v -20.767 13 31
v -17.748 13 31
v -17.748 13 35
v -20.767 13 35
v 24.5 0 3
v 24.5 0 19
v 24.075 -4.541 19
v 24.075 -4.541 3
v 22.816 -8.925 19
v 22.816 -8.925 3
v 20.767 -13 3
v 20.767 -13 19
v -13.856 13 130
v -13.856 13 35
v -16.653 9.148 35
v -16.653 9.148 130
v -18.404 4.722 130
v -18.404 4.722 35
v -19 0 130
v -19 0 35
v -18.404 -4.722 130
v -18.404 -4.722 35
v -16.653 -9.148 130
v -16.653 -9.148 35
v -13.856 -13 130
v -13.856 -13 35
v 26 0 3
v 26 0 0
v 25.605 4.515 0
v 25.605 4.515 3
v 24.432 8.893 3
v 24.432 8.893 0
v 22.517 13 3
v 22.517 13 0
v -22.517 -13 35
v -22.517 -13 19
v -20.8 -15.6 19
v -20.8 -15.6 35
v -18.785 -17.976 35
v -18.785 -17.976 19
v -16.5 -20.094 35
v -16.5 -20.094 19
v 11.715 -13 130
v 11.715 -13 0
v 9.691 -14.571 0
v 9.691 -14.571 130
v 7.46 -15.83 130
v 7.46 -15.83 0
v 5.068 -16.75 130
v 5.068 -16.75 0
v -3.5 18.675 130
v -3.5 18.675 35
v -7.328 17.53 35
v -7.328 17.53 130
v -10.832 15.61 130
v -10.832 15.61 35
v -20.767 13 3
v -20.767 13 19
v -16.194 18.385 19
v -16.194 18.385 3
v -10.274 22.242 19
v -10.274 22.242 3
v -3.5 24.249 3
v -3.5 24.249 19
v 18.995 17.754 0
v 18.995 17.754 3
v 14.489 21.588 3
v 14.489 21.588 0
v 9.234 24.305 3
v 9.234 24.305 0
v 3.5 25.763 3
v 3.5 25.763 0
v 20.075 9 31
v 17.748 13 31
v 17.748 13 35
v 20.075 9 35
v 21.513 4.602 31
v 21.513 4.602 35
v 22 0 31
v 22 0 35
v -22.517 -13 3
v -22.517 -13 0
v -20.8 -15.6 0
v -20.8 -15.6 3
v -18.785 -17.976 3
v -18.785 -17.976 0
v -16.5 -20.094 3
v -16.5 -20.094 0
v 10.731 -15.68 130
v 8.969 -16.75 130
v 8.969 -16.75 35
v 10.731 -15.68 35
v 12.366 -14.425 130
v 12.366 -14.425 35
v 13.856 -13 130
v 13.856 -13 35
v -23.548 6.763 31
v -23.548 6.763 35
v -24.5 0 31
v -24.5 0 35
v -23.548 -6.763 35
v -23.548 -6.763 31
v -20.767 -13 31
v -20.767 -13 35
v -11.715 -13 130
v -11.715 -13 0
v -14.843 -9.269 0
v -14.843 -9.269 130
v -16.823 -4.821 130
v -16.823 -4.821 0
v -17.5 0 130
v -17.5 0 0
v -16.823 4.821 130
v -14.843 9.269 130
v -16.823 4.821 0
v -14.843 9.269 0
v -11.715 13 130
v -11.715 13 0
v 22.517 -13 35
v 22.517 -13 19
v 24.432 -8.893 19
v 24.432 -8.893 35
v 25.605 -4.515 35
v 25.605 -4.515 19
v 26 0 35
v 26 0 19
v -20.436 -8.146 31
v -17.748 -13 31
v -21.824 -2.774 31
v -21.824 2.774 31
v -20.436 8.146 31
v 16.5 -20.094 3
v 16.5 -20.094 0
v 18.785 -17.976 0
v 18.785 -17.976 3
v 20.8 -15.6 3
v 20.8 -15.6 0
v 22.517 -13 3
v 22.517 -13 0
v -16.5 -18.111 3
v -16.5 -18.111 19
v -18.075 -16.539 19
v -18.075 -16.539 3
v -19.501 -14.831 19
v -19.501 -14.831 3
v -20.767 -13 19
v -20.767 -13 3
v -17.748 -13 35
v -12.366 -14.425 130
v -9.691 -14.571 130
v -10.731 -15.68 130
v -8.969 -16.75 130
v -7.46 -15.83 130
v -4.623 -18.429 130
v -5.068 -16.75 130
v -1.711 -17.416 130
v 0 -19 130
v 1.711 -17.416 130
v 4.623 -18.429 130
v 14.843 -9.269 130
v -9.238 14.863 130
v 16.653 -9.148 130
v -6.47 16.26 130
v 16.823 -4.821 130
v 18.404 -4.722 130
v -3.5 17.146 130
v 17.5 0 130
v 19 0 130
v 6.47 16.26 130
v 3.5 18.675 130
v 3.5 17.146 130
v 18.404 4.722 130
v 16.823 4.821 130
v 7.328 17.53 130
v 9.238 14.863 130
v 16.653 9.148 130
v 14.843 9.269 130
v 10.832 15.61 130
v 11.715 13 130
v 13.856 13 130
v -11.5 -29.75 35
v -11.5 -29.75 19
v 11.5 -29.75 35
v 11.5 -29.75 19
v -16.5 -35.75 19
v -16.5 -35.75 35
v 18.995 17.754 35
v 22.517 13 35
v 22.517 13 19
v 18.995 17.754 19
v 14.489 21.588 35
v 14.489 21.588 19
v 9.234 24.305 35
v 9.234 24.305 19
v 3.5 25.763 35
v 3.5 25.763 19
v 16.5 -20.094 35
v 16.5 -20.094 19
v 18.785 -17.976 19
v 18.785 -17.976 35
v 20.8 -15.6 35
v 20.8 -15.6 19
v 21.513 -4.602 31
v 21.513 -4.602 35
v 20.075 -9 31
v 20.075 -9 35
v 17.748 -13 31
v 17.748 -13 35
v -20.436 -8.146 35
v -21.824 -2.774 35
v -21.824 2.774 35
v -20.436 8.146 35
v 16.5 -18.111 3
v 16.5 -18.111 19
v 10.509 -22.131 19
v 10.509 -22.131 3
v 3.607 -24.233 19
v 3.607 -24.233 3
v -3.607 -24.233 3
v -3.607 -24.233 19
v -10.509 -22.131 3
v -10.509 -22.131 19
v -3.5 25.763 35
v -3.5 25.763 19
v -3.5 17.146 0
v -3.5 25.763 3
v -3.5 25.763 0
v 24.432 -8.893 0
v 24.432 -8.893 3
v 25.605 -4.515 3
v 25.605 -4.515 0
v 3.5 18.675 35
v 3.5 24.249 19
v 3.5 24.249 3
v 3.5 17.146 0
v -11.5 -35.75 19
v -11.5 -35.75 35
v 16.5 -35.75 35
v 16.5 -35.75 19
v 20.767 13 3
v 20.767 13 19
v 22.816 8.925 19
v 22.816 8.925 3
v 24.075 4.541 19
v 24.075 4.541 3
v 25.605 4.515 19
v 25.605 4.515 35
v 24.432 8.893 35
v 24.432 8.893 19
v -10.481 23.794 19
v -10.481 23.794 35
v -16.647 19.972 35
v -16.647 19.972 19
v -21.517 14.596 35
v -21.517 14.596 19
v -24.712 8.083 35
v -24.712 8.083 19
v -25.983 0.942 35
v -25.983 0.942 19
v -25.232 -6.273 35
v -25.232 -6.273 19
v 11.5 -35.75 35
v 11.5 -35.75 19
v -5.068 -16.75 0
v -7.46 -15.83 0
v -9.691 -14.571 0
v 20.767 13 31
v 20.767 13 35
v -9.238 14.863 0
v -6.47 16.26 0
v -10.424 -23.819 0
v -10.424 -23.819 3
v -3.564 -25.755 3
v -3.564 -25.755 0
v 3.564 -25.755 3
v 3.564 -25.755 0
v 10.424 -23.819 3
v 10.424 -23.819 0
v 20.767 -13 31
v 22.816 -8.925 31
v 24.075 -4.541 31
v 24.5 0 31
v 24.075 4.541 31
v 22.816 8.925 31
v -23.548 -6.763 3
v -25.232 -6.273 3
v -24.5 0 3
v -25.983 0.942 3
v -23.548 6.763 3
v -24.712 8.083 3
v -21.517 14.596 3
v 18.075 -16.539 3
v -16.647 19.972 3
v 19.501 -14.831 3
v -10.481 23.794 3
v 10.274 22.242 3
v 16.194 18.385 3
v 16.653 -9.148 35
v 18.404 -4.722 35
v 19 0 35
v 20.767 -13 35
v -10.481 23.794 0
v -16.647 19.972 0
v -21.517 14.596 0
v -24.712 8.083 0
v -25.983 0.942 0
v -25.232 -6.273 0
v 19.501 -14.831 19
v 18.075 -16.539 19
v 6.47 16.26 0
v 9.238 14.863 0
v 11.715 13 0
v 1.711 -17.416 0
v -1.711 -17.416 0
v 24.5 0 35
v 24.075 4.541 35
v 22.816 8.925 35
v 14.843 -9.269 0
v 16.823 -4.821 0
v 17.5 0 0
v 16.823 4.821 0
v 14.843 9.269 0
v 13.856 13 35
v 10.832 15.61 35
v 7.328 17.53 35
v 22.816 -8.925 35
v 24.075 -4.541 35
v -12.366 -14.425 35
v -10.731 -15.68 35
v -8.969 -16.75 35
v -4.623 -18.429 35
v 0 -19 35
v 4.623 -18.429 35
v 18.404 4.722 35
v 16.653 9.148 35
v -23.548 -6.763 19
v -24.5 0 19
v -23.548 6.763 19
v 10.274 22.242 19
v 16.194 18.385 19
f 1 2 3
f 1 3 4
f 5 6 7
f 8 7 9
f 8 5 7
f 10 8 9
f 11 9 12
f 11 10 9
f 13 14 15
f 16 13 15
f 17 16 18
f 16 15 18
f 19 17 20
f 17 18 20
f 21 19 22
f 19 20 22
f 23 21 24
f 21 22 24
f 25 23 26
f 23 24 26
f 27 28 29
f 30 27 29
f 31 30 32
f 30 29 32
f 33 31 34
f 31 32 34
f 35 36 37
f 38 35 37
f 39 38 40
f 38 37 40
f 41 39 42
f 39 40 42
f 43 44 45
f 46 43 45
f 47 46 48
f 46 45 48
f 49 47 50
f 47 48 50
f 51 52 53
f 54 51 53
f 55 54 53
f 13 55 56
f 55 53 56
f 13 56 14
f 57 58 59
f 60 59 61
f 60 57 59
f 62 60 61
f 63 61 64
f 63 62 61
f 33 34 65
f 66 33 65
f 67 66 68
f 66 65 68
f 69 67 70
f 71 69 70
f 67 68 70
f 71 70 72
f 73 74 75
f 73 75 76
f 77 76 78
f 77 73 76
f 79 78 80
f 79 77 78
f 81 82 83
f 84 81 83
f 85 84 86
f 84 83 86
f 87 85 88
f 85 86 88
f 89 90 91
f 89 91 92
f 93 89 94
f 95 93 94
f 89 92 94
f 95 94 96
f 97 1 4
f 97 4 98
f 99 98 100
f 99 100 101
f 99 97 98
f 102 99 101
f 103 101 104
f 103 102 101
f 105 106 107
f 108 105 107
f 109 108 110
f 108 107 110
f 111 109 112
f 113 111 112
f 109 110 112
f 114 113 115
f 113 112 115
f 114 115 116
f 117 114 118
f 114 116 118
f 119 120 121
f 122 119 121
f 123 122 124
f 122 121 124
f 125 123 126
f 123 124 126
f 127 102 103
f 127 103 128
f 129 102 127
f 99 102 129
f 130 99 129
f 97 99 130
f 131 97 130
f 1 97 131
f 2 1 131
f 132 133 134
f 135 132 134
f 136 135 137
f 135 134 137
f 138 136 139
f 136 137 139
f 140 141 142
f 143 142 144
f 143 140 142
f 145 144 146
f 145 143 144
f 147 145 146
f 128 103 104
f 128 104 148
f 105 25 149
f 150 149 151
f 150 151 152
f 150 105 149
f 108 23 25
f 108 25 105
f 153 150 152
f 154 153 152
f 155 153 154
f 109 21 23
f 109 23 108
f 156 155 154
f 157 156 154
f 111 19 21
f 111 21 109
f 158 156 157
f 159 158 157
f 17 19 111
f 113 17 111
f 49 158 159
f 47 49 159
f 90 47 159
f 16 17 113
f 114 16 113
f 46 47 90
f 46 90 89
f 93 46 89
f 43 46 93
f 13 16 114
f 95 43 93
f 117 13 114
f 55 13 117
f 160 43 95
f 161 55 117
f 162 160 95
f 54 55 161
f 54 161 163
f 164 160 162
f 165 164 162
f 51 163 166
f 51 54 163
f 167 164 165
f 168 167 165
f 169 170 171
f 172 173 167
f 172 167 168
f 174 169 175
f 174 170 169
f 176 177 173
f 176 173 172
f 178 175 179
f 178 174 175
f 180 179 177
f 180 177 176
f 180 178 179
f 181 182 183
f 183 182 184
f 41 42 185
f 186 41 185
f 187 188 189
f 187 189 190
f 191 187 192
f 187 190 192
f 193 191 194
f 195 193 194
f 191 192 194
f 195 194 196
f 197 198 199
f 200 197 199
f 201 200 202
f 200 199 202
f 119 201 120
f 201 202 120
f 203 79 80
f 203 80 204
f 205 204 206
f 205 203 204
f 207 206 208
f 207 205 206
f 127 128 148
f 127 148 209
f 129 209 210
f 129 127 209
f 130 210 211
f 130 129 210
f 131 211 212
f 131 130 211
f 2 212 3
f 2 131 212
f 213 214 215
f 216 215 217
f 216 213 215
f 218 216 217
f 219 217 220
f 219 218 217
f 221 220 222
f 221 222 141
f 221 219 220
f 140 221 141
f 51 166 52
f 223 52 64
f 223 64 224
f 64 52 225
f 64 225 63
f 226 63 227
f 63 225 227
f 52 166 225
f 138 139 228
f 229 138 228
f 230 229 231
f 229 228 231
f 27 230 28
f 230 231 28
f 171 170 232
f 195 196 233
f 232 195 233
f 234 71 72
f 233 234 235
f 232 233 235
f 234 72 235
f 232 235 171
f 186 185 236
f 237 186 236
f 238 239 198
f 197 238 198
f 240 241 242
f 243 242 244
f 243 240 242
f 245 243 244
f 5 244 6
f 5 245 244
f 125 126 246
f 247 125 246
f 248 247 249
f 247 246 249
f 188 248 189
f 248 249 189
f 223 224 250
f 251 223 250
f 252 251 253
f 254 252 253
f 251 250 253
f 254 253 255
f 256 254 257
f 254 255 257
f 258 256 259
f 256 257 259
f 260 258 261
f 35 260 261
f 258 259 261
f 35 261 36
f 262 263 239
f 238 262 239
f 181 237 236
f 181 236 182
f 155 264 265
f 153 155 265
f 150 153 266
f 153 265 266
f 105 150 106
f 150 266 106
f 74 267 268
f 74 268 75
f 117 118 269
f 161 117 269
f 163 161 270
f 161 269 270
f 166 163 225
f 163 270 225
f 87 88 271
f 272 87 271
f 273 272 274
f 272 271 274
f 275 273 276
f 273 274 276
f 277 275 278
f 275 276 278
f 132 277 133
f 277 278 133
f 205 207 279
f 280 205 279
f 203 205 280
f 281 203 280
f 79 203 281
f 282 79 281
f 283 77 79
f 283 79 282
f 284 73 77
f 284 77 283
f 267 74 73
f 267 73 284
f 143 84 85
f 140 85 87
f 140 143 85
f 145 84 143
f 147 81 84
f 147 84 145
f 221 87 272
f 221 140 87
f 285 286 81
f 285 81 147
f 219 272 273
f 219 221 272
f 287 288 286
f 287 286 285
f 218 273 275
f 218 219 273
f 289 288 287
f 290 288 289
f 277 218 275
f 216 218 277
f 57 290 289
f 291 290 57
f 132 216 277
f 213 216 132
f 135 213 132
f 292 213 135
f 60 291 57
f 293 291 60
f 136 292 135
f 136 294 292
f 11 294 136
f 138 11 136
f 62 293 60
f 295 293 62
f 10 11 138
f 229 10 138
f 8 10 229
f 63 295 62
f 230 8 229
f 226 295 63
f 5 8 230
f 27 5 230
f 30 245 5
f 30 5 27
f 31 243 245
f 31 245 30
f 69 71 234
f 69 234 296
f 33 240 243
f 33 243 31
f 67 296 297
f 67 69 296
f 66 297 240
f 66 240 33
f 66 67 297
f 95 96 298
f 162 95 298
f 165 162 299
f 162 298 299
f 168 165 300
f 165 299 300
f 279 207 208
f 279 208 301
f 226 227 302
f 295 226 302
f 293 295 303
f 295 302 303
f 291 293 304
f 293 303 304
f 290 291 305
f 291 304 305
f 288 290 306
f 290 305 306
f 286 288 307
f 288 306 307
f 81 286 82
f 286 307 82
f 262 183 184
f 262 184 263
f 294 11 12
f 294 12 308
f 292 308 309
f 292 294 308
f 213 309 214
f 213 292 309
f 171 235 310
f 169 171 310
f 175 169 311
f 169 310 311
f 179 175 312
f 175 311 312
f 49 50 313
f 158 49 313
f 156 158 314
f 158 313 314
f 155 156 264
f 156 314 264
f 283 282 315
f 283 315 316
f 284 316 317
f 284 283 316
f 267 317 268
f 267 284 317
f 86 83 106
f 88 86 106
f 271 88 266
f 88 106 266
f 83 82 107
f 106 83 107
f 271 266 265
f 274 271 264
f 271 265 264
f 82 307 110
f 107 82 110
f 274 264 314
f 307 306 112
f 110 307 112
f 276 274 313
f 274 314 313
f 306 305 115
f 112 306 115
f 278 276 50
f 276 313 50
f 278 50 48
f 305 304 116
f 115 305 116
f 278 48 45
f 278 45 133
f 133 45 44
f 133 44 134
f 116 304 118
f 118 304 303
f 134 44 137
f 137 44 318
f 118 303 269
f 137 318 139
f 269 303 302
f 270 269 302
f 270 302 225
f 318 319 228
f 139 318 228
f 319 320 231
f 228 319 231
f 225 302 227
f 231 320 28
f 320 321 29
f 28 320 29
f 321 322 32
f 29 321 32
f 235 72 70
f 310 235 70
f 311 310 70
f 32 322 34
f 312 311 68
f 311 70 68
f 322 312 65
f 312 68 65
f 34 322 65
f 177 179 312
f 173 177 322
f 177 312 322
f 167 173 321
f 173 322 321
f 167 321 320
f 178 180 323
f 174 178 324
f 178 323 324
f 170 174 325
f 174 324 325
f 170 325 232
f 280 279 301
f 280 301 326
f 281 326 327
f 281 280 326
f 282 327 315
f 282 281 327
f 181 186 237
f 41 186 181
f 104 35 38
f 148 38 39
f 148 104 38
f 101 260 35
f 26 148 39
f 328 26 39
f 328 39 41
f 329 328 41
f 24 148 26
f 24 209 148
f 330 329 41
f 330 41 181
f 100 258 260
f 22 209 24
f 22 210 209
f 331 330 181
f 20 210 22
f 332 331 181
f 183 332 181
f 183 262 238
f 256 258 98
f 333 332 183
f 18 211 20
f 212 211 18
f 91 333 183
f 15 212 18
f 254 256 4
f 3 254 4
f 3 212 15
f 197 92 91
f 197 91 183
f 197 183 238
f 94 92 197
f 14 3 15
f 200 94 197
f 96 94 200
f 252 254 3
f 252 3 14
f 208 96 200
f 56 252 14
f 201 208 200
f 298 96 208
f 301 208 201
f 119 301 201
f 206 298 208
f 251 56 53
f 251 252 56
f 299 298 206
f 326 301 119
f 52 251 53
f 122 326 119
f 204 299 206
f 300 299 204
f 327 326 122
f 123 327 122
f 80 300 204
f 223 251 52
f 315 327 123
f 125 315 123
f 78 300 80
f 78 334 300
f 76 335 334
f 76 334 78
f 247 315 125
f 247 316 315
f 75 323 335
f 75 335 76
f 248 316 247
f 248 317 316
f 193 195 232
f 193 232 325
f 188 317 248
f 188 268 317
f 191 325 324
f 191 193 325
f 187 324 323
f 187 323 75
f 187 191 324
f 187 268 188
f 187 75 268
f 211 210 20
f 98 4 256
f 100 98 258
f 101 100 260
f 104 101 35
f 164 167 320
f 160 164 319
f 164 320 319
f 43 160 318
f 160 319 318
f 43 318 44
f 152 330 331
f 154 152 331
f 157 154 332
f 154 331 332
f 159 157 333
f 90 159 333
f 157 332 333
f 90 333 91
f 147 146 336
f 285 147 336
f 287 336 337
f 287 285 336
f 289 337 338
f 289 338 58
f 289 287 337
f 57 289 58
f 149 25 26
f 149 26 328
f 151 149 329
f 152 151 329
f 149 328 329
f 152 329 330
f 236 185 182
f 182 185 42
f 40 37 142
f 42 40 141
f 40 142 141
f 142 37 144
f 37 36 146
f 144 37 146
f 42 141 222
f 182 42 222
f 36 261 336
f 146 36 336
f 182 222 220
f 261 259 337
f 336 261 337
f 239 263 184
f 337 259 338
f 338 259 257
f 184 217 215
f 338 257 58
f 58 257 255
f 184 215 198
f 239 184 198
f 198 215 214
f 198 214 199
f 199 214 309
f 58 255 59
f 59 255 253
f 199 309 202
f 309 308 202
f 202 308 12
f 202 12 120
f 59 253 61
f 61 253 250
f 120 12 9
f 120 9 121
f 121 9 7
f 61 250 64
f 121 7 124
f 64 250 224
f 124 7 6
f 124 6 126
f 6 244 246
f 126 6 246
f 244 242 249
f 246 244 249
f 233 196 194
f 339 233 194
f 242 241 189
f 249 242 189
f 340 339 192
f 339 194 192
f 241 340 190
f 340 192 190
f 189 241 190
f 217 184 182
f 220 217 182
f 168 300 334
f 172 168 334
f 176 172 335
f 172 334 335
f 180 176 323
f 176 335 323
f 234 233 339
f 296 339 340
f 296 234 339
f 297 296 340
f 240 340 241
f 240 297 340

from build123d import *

# Parameters (mm, degrees)
F1_DEPTH = 130
F2_DEPTH = 35
F3_START = 31
F3_DEPTH = 4
F4_START = 19
F4_DEPTH = 16
F5_START = 3
F5_DEPTH = 16


with BuildPart() as f1:
    # F0 (on Top) → F1 (new body)
    with BuildSketch(Plane.XY):
        with BuildLine():
            Line((11.7153745139, 13), (13.8564064606, 13))
            ThreePointArc((13.8564064606, 13), (9.130289712, 16.6624670975), (3.5, 18.674849397))
            Line((3.5, 18.674849397), (3.5, 17.1464281995))
            ThreePointArc((3.5, 17.1464281995), (7.8851202973, 15.6228959511), (11.7153745139, 13))
        make_face()
        with BuildLine():
            Line((-3.5, 17.1464281995), (-3.5, 18.674849397))
            ThreePointArc((-3.5, 18.674849397), (-9.130289712, 16.6624670975), (-13.8564064606, 13))
            Line((-13.8564064606, 13), (-11.7153745139, 13))
            ThreePointArc((-11.7153745139, 13), (-7.8851202973, 15.6228959511), (-3.5, 17.1464281995))
        make_face()
        with BuildLine():
            Line((-13.8564064606, -13), (-11.7153745139, -13))
            ThreePointArc((-11.7153745139, -13), (-17.5, 0), (-11.7153745139, 13))
            Line((-11.7153745139, 13), (-13.8564064606, 13))
            ThreePointArc((-13.8564064606, 13), (-19, 0), (-13.8564064606, -13))
        make_face()
        with BuildLine():
            ThreePointArc((-13.8564064606, -13), (-11.5655499451, -15.0744172182), (-8.9686955573, -16.75))
            Line((-8.9686955573, -16.75), (-5.0682837332, -16.75))
            ThreePointArc((-5.0682837332, -16.75), (-8.5987453177, -15.2417708604), (-11.7153745139, -13))
            Line((-11.7153745139, -13), (-13.8564064606, -13))
        make_face()
        with BuildLine():
            ThreePointArc((-8.9686955573, -16.75), (0, -19), (8.9686955573, -16.75))
            Line((8.9686955573, -16.75), (5.0682837332, -16.75))
            ThreePointArc((5.0682837332, -16.75), (0, -17.5), (-5.0682837332, -16.75))
            Line((-5.0682837332, -16.75), (-8.9686955573, -16.75))
        make_face()
        with BuildLine():
            ThreePointArc((8.9686955573, -16.75), (11.5655499451, -15.0744172182), (13.8564064606, -13))
            Line((13.8564064606, -13), (11.7153745139, -13))
            ThreePointArc((11.7153745139, -13), (8.5987453177, -15.2417708604), (5.0682837332, -16.75))
            Line((5.0682837332, -16.75), (8.9686955573, -16.75))
        make_face()
        with BuildLine():
            ThreePointArc((13.8564064606, -13), (17.667367132, -6.9902888799), (19, 0))
            ThreePointArc((19, 0), (17.667367132, 6.9902888799), (13.8564064606, 13))
            Line((13.8564064606, 13), (11.7153745139, 13))
            ThreePointArc((11.7153745139, 13), (15.9885748895, 7.1144552148), (17.5, 0))
            ThreePointArc((17.5, 0), (15.9885748895, -7.1144552148), (11.7153745139, -13))
            Line((11.7153745139, -13), (13.8564064606, -13))
        make_face()
    extrude(amount=F1_DEPTH)

    # F0 (on Top) → F2 (join)
    with BuildSketch(Plane.XY):
        with BuildLine():
            Line((22.5166604984, 13), (20.7665596573, 13))
            ThreePointArc((20.7665596573, 13), (23.548149732, 6.7627394004), (24.5, 0))
            ThreePointArc((24.5, 0), (23.548149732, -6.7627394004), (20.7665596573, -13))
            Line((20.7665596573, -13), (22.5166604984, -13))
            ThreePointArc((22.5166604984, -13), (25.1140714835, -6.7292951727), (26, 0))
            ThreePointArc((26, 0), (25.1140714835, 6.7292951727), (22.5166604984, 13))
        make_face()
        with BuildLine():
            ThreePointArc((3.5, 24.248711306), (13.3734758351, 20.5280331276), (20.7665596573, 13))
            Line((20.7665596573, 13), (22.5166604984, 13))
            ThreePointArc((22.5166604984, 13), (14.4893894457, 21.5883670872), (3.5, 25.763346056))
            Line((3.5, 25.763346056), (3.5, 24.248711306))
        make_face()
        with BuildLine():
            Line((-16.5, -20.0935312974), (-16.5, -18.1107702763))
            ThreePointArc((-16.5, -18.1107702763), (-18.807687534, -15.7009837151), (-20.7665596573, -13))
            Line((-20.7665596573, -13), (-22.5166604984, -13))
            ThreePointArc((-22.5166604984, -13), (-19.8281238567, -16.818011307), (-16.5, -20.0935312974))
        make_face()
        with BuildLine():
            ThreePointArc((-20.7665596573, 13), (-13.3734758351, 20.5280331276), (-3.5, 24.248711306))
            Line((-3.5, 24.248711306), (-3.5, 25.763346056))
            ThreePointArc((-3.5, 25.763346056), (-14.4893894457, 21.5883670872), (-22.5166604984, 13))
            Line((-22.5166604984, 13), (-20.7665596573, 13))
        make_face()
        with BuildLine():
            Line((16.5, -20.0935312974), (16.5, -18.1107702763))
            ThreePointArc((16.5, -18.1107702763), (0, -24.5), (-16.5, -18.1107702763))
            Line((-16.5, -18.1107702763), (-16.5, -20.0935312974))
            ThreePointArc((-16.5, -20.0935312974), (0, -26), (16.5, -20.0935312974))
        make_face()
        with BuildLine():
            Line((20.7665596573, 13), (17.7482393493, 13))
            ThreePointArc((17.7482393493, 13), (20.9100605652, 6.8388132858), (22, 0))
            ThreePointArc((22, 0), (20.9100605652, -6.8388132858), (17.7482393493, -13))
            Line((17.7482393493, -13), (20.7665596573, -13))
            ThreePointArc((20.7665596573, -13), (23.548149732, -6.7627394004), (24.5, 0))
            ThreePointArc((24.5, 0), (23.548149732, 6.7627394004), (20.7665596573, 13))
        make_face()
        with BuildLine():
            ThreePointArc((3.5, 21.719806629), (11.4839311985, 18.7648427712), (17.7482393493, 13))
            Line((17.7482393493, 13), (20.7665596573, 13))
            ThreePointArc((20.7665596573, 13), (13.3734758351, 20.5280331276), (3.5, 24.248711306))
            Line((3.5, 24.248711306), (3.5, 21.719806629))
        make_face()
        with BuildLine():
            ThreePointArc((-17.7482393493, 13), (-11.4839311985, 18.7648427712), (-3.5, 21.719806629))
            Line((-3.5, 21.719806629), (-3.5, 24.248711306))
            ThreePointArc((-3.5, 24.248711306), (-13.3734758351, 20.5280331276), (-20.7665596573, 13))
            Line((-20.7665596573, 13), (-17.7482393493, 13))
        make_face()
        with BuildLine():
            ThreePointArc((13.8564064606, 13), (17.667367132, 6.9902888799), (19, 0))
            ThreePointArc((19, 0), (17.667367132, -6.9902888799), (13.8564064606, -13))
            Line((13.8564064606, -13), (17.7482393493, -13))
            ThreePointArc((17.7482393493, -13), (20.9100605652, -6.8388132858), (22, 0))
            ThreePointArc((22, 0), (20.9100605652, 6.8388132858), (17.7482393493, 13))
            Line((17.7482393493, 13), (13.8564064606, 13))
        make_face()
        with BuildLine():
            ThreePointArc((3.5, 18.674849397), (9.130289712, 16.6624670975), (13.8564064606, 13))
            Line((13.8564064606, 13), (17.7482393493, 13))
            ThreePointArc((17.7482393493, 13), (11.4839311985, 18.7648427712), (3.5, 21.719806629))
            Line((3.5, 21.719806629), (3.5, 18.674849397))
        make_face()
        with BuildLine():
            Line((-14.2631518256, -16.75), (-8.9686955573, -16.75))
            ThreePointArc((-8.9686955573, -16.75), (-11.5655499451, -15.0744172182), (-13.8564064606, -13))
            Line((-13.8564064606, -13), (-17.7482393493, -13))
            ThreePointArc((-17.7482393493, -13), (-16.1151455544, -14.9767180571), (-14.2631518256, -16.75))
        make_face()
        with BuildLine():
            Line((14.2631518256, -16.75), (8.9686955573, -16.75))
            ThreePointArc((8.9686955573, -16.75), (0, -19), (-8.9686955573, -16.75))
            Line((-8.9686955573, -16.75), (-14.2631518256, -16.75))
            ThreePointArc((-14.2631518256, -16.75), (0, -22), (14.2631518256, -16.75))
        make_face()
        with BuildLine():
            Line((17.7482393493, -13), (13.8564064606, -13))
            ThreePointArc((13.8564064606, -13), (11.5655499451, -15.0744172182), (8.9686955573, -16.75))
            Line((8.9686955573, -16.75), (14.2631518256, -16.75))
            ThreePointArc((14.2631518256, -16.75), (16.1151455544, -14.9767180571), (17.7482393493, -13))
        make_face()
        with BuildLine():
            ThreePointArc((-13.8564064606, 13), (-9.130289712, 16.6624670975), (-3.5, 18.674849397))
            Line((-3.5, 18.674849397), (-3.5, 21.719806629))
            ThreePointArc((-3.5, 21.719806629), (-11.4839311985, 18.7648427712), (-17.7482393493, 13))
            Line((-17.7482393493, 13), (-13.8564064606, 13))
        make_face()
        with BuildLine():
            Line((16.5, -16.75), (14.2631518256, -16.75))
            ThreePointArc((14.2631518256, -16.75), (0, -22), (-14.2631518256, -16.75))
            Line((-14.2631518256, -16.75), (-16.5, -16.75))
            Line((-16.5, -16.75), (-16.5, -18.1107702763))
            ThreePointArc((-16.5, -18.1107702763), (0, -24.5), (16.5, -18.1107702763))
            Line((16.5, -18.1107702763), (16.5, -16.75))
        make_face()
        with BuildLine():
            Line((22.5166604984, -13), (20.7665596573, -13))
            ThreePointArc((20.7665596573, -13), (18.807687534, -15.7009837151), (16.5, -18.1107702763))
            Line((16.5, -18.1107702763), (16.5, -20.0935312974))
            ThreePointArc((16.5, -20.0935312974), (19.8281238567, -16.818011307), (22.5166604984, -13))
        make_face()
        with BuildLine():
            Line((20.7665596573, -13), (17.7482393493, -13))
            ThreePointArc((17.7482393493, -13), (16.1151455544, -14.9767180571), (14.2631518256, -16.75))
            Line((14.2631518256, -16.75), (16.5, -16.75))
            Line((16.5, -16.75), (16.5, -18.1107702763))
            ThreePointArc((16.5, -18.1107702763), (18.807687534, -15.7009837151), (20.7665596573, -13))
        make_face()
        with BuildLine():
            Line((-16.5, -16.75), (-14.2631518256, -16.75))
            ThreePointArc((-14.2631518256, -16.75), (-16.1151455544, -14.9767180571), (-17.7482393493, -13))
            Line((-17.7482393493, -13), (-20.7665596573, -13))
            ThreePointArc((-20.7665596573, -13), (-18.807687534, -15.7009837151), (-16.5, -18.1107702763))
            Line((-16.5, -18.1107702763), (-16.5, -16.75))
        make_face()
        with BuildLine():
            ThreePointArc((-13.8564064606, -13), (-19, 0), (-13.8564064606, 13))
            Line((-13.8564064606, 13), (-17.7482393493, 13))
            ThreePointArc((-17.7482393493, 13), (-22, 0), (-17.7482393493, -13))
            Line((-17.7482393493, -13), (-13.8564064606, -13))
        make_face()
        with BuildLine():
            ThreePointArc((-17.7482393493, -13), (-22, 0), (-17.7482393493, 13))
            Line((-17.7482393493, 13), (-20.7665596573, 13))
            ThreePointArc((-20.7665596573, 13), (-24.5, 0), (-20.7665596573, -13))
            Line((-20.7665596573, -13), (-17.7482393493, -13))
        make_face()
        with BuildLine():
            ThreePointArc((-20.7665596573, -13), (-24.5, 0), (-20.7665596573, 13))
            Line((-20.7665596573, 13), (-22.5166604984, 13))
            ThreePointArc((-22.5166604984, 13), (-26, 0), (-22.5166604984, -13))
            Line((-22.5166604984, -13), (-20.7665596573, -13))
        make_face()
    extrude(amount=F2_DEPTH)

    # F0 (on Top) → F3 (cut)
    with BuildSketch(Plane.XY.offset(F3_START)):
        with BuildLine():
            Line((20.7665596573, 13), (17.7482393493, 13))
            ThreePointArc((17.7482393493, 13), (20.9100605652, 6.8388132858), (22, 0))
            ThreePointArc((22, 0), (20.9100605652, -6.8388132858), (17.7482393493, -13))
            Line((17.7482393493, -13), (20.7665596573, -13))
            ThreePointArc((20.7665596573, -13), (23.548149732, -6.7627394004), (24.5, 0))
            ThreePointArc((24.5, 0), (23.548149732, 6.7627394004), (20.7665596573, 13))
        make_face()
        with BuildLine():
            ThreePointArc((-17.7482393493, -13), (-22, 0), (-17.7482393493, 13))
            Line((-17.7482393493, 13), (-20.7665596573, 13))
            ThreePointArc((-20.7665596573, 13), (-24.5, 0), (-20.7665596573, -13))
            Line((-20.7665596573, -13), (-17.7482393493, -13))
        make_face()
    extrude(amount=F3_DEPTH, mode=Mode.SUBTRACT)

    # F0 (on Top) → F4 (join)
    with BuildSketch(Plane.XY.offset(F4_START)):
        with BuildLine():
            Line((16.5, -35.75), (16.5, -20.0935312974))
            ThreePointArc((16.5, -20.0935312974), (0, -26), (-16.5, -20.0935312974))
            Line((-16.5, -20.0935312974), (-16.5, -35.75))
            Line((-16.5, -35.75), (-11.5, -35.75))
            Line((-11.5, -35.75), (-11.5, -29.75))
            Line((-11.5, -29.75), (11.5, -29.75))
            Line((11.5, -29.75), (11.5, -35.75))
            Line((11.5, -35.75), (16.5, -35.75))
        make_face()
    extrude(amount=F4_DEPTH)

    # F0 (on Top) → F5 (cut)
    with BuildSketch(Plane.XY.offset(F5_START)):
        with BuildLine():
            Line((22.5166604984, 13), (20.7665596573, 13))
            ThreePointArc((20.7665596573, 13), (23.548149732, 6.7627394004), (24.5, 0))
            ThreePointArc((24.5, 0), (23.548149732, -6.7627394004), (20.7665596573, -13))
            Line((20.7665596573, -13), (22.5166604984, -13))
            ThreePointArc((22.5166604984, -13), (25.1140714835, -6.7292951727), (26, 0))
            ThreePointArc((26, 0), (25.1140714835, 6.7292951727), (22.5166604984, 13))
        make_face()
        with BuildLine():
            ThreePointArc((3.5, 24.248711306), (13.3734758351, 20.5280331276), (20.7665596573, 13))
            Line((20.7665596573, 13), (22.5166604984, 13))
            ThreePointArc((22.5166604984, 13), (14.4893894457, 21.5883670872), (3.5, 25.763346056))
            Line((3.5, 25.763346056), (3.5, 24.248711306))
        make_face()
        with BuildLine():
            Line((-16.5, -20.0935312974), (-16.5, -18.1107702763))
            ThreePointArc((-16.5, -18.1107702763), (-18.807687534, -15.7009837151), (-20.7665596573, -13))
            Line((-20.7665596573, -13), (-22.5166604984, -13))
            ThreePointArc((-22.5166604984, -13), (-19.8281238567, -16.818011307), (-16.5, -20.0935312974))
        make_face()
        with BuildLine():
            Line((16.5, -20.0935312974), (16.5, -18.1107702763))
            ThreePointArc((16.5, -18.1107702763), (0, -24.5), (-16.5, -18.1107702763))
            Line((-16.5, -18.1107702763), (-16.5, -20.0935312974))
            ThreePointArc((-16.5, -20.0935312974), (0, -26), (16.5, -20.0935312974))
        make_face()
        with BuildLine():
            Line((22.5166604984, -13), (20.7665596573, -13))
            ThreePointArc((20.7665596573, -13), (18.807687534, -15.7009837151), (16.5, -18.1107702763))
            Line((16.5, -18.1107702763), (16.5, -20.0935312974))
            ThreePointArc((16.5, -20.0935312974), (19.8281238567, -16.818011307), (22.5166604984, -13))
        make_face()
        with BuildLine():
            ThreePointArc((-20.7665596573, 13), (-13.3734758351, 20.5280331276), (-3.5, 24.248711306))
            Line((-3.5, 24.248711306), (-3.5, 25.763346056))
            ThreePointArc((-3.5, 25.763346056), (-14.4893894457, 21.5883670872), (-22.5166604984, 13))
            Line((-22.5166604984, 13), (-20.7665596573, 13))
        make_face()
        with BuildLine():
            ThreePointArc((-20.7665596573, -13), (-24.5, 0), (-20.7665596573, 13))
            Line((-20.7665596573, 13), (-22.5166604984, 13))
            ThreePointArc((-22.5166604984, 13), (-26, 0), (-22.5166604984, -13))
            Line((-22.5166604984, -13), (-20.7665596573, -13))
        make_face()
    extrude(amount=F5_DEPTH, mode=Mode.SUBTRACT)


solid = f1.part
